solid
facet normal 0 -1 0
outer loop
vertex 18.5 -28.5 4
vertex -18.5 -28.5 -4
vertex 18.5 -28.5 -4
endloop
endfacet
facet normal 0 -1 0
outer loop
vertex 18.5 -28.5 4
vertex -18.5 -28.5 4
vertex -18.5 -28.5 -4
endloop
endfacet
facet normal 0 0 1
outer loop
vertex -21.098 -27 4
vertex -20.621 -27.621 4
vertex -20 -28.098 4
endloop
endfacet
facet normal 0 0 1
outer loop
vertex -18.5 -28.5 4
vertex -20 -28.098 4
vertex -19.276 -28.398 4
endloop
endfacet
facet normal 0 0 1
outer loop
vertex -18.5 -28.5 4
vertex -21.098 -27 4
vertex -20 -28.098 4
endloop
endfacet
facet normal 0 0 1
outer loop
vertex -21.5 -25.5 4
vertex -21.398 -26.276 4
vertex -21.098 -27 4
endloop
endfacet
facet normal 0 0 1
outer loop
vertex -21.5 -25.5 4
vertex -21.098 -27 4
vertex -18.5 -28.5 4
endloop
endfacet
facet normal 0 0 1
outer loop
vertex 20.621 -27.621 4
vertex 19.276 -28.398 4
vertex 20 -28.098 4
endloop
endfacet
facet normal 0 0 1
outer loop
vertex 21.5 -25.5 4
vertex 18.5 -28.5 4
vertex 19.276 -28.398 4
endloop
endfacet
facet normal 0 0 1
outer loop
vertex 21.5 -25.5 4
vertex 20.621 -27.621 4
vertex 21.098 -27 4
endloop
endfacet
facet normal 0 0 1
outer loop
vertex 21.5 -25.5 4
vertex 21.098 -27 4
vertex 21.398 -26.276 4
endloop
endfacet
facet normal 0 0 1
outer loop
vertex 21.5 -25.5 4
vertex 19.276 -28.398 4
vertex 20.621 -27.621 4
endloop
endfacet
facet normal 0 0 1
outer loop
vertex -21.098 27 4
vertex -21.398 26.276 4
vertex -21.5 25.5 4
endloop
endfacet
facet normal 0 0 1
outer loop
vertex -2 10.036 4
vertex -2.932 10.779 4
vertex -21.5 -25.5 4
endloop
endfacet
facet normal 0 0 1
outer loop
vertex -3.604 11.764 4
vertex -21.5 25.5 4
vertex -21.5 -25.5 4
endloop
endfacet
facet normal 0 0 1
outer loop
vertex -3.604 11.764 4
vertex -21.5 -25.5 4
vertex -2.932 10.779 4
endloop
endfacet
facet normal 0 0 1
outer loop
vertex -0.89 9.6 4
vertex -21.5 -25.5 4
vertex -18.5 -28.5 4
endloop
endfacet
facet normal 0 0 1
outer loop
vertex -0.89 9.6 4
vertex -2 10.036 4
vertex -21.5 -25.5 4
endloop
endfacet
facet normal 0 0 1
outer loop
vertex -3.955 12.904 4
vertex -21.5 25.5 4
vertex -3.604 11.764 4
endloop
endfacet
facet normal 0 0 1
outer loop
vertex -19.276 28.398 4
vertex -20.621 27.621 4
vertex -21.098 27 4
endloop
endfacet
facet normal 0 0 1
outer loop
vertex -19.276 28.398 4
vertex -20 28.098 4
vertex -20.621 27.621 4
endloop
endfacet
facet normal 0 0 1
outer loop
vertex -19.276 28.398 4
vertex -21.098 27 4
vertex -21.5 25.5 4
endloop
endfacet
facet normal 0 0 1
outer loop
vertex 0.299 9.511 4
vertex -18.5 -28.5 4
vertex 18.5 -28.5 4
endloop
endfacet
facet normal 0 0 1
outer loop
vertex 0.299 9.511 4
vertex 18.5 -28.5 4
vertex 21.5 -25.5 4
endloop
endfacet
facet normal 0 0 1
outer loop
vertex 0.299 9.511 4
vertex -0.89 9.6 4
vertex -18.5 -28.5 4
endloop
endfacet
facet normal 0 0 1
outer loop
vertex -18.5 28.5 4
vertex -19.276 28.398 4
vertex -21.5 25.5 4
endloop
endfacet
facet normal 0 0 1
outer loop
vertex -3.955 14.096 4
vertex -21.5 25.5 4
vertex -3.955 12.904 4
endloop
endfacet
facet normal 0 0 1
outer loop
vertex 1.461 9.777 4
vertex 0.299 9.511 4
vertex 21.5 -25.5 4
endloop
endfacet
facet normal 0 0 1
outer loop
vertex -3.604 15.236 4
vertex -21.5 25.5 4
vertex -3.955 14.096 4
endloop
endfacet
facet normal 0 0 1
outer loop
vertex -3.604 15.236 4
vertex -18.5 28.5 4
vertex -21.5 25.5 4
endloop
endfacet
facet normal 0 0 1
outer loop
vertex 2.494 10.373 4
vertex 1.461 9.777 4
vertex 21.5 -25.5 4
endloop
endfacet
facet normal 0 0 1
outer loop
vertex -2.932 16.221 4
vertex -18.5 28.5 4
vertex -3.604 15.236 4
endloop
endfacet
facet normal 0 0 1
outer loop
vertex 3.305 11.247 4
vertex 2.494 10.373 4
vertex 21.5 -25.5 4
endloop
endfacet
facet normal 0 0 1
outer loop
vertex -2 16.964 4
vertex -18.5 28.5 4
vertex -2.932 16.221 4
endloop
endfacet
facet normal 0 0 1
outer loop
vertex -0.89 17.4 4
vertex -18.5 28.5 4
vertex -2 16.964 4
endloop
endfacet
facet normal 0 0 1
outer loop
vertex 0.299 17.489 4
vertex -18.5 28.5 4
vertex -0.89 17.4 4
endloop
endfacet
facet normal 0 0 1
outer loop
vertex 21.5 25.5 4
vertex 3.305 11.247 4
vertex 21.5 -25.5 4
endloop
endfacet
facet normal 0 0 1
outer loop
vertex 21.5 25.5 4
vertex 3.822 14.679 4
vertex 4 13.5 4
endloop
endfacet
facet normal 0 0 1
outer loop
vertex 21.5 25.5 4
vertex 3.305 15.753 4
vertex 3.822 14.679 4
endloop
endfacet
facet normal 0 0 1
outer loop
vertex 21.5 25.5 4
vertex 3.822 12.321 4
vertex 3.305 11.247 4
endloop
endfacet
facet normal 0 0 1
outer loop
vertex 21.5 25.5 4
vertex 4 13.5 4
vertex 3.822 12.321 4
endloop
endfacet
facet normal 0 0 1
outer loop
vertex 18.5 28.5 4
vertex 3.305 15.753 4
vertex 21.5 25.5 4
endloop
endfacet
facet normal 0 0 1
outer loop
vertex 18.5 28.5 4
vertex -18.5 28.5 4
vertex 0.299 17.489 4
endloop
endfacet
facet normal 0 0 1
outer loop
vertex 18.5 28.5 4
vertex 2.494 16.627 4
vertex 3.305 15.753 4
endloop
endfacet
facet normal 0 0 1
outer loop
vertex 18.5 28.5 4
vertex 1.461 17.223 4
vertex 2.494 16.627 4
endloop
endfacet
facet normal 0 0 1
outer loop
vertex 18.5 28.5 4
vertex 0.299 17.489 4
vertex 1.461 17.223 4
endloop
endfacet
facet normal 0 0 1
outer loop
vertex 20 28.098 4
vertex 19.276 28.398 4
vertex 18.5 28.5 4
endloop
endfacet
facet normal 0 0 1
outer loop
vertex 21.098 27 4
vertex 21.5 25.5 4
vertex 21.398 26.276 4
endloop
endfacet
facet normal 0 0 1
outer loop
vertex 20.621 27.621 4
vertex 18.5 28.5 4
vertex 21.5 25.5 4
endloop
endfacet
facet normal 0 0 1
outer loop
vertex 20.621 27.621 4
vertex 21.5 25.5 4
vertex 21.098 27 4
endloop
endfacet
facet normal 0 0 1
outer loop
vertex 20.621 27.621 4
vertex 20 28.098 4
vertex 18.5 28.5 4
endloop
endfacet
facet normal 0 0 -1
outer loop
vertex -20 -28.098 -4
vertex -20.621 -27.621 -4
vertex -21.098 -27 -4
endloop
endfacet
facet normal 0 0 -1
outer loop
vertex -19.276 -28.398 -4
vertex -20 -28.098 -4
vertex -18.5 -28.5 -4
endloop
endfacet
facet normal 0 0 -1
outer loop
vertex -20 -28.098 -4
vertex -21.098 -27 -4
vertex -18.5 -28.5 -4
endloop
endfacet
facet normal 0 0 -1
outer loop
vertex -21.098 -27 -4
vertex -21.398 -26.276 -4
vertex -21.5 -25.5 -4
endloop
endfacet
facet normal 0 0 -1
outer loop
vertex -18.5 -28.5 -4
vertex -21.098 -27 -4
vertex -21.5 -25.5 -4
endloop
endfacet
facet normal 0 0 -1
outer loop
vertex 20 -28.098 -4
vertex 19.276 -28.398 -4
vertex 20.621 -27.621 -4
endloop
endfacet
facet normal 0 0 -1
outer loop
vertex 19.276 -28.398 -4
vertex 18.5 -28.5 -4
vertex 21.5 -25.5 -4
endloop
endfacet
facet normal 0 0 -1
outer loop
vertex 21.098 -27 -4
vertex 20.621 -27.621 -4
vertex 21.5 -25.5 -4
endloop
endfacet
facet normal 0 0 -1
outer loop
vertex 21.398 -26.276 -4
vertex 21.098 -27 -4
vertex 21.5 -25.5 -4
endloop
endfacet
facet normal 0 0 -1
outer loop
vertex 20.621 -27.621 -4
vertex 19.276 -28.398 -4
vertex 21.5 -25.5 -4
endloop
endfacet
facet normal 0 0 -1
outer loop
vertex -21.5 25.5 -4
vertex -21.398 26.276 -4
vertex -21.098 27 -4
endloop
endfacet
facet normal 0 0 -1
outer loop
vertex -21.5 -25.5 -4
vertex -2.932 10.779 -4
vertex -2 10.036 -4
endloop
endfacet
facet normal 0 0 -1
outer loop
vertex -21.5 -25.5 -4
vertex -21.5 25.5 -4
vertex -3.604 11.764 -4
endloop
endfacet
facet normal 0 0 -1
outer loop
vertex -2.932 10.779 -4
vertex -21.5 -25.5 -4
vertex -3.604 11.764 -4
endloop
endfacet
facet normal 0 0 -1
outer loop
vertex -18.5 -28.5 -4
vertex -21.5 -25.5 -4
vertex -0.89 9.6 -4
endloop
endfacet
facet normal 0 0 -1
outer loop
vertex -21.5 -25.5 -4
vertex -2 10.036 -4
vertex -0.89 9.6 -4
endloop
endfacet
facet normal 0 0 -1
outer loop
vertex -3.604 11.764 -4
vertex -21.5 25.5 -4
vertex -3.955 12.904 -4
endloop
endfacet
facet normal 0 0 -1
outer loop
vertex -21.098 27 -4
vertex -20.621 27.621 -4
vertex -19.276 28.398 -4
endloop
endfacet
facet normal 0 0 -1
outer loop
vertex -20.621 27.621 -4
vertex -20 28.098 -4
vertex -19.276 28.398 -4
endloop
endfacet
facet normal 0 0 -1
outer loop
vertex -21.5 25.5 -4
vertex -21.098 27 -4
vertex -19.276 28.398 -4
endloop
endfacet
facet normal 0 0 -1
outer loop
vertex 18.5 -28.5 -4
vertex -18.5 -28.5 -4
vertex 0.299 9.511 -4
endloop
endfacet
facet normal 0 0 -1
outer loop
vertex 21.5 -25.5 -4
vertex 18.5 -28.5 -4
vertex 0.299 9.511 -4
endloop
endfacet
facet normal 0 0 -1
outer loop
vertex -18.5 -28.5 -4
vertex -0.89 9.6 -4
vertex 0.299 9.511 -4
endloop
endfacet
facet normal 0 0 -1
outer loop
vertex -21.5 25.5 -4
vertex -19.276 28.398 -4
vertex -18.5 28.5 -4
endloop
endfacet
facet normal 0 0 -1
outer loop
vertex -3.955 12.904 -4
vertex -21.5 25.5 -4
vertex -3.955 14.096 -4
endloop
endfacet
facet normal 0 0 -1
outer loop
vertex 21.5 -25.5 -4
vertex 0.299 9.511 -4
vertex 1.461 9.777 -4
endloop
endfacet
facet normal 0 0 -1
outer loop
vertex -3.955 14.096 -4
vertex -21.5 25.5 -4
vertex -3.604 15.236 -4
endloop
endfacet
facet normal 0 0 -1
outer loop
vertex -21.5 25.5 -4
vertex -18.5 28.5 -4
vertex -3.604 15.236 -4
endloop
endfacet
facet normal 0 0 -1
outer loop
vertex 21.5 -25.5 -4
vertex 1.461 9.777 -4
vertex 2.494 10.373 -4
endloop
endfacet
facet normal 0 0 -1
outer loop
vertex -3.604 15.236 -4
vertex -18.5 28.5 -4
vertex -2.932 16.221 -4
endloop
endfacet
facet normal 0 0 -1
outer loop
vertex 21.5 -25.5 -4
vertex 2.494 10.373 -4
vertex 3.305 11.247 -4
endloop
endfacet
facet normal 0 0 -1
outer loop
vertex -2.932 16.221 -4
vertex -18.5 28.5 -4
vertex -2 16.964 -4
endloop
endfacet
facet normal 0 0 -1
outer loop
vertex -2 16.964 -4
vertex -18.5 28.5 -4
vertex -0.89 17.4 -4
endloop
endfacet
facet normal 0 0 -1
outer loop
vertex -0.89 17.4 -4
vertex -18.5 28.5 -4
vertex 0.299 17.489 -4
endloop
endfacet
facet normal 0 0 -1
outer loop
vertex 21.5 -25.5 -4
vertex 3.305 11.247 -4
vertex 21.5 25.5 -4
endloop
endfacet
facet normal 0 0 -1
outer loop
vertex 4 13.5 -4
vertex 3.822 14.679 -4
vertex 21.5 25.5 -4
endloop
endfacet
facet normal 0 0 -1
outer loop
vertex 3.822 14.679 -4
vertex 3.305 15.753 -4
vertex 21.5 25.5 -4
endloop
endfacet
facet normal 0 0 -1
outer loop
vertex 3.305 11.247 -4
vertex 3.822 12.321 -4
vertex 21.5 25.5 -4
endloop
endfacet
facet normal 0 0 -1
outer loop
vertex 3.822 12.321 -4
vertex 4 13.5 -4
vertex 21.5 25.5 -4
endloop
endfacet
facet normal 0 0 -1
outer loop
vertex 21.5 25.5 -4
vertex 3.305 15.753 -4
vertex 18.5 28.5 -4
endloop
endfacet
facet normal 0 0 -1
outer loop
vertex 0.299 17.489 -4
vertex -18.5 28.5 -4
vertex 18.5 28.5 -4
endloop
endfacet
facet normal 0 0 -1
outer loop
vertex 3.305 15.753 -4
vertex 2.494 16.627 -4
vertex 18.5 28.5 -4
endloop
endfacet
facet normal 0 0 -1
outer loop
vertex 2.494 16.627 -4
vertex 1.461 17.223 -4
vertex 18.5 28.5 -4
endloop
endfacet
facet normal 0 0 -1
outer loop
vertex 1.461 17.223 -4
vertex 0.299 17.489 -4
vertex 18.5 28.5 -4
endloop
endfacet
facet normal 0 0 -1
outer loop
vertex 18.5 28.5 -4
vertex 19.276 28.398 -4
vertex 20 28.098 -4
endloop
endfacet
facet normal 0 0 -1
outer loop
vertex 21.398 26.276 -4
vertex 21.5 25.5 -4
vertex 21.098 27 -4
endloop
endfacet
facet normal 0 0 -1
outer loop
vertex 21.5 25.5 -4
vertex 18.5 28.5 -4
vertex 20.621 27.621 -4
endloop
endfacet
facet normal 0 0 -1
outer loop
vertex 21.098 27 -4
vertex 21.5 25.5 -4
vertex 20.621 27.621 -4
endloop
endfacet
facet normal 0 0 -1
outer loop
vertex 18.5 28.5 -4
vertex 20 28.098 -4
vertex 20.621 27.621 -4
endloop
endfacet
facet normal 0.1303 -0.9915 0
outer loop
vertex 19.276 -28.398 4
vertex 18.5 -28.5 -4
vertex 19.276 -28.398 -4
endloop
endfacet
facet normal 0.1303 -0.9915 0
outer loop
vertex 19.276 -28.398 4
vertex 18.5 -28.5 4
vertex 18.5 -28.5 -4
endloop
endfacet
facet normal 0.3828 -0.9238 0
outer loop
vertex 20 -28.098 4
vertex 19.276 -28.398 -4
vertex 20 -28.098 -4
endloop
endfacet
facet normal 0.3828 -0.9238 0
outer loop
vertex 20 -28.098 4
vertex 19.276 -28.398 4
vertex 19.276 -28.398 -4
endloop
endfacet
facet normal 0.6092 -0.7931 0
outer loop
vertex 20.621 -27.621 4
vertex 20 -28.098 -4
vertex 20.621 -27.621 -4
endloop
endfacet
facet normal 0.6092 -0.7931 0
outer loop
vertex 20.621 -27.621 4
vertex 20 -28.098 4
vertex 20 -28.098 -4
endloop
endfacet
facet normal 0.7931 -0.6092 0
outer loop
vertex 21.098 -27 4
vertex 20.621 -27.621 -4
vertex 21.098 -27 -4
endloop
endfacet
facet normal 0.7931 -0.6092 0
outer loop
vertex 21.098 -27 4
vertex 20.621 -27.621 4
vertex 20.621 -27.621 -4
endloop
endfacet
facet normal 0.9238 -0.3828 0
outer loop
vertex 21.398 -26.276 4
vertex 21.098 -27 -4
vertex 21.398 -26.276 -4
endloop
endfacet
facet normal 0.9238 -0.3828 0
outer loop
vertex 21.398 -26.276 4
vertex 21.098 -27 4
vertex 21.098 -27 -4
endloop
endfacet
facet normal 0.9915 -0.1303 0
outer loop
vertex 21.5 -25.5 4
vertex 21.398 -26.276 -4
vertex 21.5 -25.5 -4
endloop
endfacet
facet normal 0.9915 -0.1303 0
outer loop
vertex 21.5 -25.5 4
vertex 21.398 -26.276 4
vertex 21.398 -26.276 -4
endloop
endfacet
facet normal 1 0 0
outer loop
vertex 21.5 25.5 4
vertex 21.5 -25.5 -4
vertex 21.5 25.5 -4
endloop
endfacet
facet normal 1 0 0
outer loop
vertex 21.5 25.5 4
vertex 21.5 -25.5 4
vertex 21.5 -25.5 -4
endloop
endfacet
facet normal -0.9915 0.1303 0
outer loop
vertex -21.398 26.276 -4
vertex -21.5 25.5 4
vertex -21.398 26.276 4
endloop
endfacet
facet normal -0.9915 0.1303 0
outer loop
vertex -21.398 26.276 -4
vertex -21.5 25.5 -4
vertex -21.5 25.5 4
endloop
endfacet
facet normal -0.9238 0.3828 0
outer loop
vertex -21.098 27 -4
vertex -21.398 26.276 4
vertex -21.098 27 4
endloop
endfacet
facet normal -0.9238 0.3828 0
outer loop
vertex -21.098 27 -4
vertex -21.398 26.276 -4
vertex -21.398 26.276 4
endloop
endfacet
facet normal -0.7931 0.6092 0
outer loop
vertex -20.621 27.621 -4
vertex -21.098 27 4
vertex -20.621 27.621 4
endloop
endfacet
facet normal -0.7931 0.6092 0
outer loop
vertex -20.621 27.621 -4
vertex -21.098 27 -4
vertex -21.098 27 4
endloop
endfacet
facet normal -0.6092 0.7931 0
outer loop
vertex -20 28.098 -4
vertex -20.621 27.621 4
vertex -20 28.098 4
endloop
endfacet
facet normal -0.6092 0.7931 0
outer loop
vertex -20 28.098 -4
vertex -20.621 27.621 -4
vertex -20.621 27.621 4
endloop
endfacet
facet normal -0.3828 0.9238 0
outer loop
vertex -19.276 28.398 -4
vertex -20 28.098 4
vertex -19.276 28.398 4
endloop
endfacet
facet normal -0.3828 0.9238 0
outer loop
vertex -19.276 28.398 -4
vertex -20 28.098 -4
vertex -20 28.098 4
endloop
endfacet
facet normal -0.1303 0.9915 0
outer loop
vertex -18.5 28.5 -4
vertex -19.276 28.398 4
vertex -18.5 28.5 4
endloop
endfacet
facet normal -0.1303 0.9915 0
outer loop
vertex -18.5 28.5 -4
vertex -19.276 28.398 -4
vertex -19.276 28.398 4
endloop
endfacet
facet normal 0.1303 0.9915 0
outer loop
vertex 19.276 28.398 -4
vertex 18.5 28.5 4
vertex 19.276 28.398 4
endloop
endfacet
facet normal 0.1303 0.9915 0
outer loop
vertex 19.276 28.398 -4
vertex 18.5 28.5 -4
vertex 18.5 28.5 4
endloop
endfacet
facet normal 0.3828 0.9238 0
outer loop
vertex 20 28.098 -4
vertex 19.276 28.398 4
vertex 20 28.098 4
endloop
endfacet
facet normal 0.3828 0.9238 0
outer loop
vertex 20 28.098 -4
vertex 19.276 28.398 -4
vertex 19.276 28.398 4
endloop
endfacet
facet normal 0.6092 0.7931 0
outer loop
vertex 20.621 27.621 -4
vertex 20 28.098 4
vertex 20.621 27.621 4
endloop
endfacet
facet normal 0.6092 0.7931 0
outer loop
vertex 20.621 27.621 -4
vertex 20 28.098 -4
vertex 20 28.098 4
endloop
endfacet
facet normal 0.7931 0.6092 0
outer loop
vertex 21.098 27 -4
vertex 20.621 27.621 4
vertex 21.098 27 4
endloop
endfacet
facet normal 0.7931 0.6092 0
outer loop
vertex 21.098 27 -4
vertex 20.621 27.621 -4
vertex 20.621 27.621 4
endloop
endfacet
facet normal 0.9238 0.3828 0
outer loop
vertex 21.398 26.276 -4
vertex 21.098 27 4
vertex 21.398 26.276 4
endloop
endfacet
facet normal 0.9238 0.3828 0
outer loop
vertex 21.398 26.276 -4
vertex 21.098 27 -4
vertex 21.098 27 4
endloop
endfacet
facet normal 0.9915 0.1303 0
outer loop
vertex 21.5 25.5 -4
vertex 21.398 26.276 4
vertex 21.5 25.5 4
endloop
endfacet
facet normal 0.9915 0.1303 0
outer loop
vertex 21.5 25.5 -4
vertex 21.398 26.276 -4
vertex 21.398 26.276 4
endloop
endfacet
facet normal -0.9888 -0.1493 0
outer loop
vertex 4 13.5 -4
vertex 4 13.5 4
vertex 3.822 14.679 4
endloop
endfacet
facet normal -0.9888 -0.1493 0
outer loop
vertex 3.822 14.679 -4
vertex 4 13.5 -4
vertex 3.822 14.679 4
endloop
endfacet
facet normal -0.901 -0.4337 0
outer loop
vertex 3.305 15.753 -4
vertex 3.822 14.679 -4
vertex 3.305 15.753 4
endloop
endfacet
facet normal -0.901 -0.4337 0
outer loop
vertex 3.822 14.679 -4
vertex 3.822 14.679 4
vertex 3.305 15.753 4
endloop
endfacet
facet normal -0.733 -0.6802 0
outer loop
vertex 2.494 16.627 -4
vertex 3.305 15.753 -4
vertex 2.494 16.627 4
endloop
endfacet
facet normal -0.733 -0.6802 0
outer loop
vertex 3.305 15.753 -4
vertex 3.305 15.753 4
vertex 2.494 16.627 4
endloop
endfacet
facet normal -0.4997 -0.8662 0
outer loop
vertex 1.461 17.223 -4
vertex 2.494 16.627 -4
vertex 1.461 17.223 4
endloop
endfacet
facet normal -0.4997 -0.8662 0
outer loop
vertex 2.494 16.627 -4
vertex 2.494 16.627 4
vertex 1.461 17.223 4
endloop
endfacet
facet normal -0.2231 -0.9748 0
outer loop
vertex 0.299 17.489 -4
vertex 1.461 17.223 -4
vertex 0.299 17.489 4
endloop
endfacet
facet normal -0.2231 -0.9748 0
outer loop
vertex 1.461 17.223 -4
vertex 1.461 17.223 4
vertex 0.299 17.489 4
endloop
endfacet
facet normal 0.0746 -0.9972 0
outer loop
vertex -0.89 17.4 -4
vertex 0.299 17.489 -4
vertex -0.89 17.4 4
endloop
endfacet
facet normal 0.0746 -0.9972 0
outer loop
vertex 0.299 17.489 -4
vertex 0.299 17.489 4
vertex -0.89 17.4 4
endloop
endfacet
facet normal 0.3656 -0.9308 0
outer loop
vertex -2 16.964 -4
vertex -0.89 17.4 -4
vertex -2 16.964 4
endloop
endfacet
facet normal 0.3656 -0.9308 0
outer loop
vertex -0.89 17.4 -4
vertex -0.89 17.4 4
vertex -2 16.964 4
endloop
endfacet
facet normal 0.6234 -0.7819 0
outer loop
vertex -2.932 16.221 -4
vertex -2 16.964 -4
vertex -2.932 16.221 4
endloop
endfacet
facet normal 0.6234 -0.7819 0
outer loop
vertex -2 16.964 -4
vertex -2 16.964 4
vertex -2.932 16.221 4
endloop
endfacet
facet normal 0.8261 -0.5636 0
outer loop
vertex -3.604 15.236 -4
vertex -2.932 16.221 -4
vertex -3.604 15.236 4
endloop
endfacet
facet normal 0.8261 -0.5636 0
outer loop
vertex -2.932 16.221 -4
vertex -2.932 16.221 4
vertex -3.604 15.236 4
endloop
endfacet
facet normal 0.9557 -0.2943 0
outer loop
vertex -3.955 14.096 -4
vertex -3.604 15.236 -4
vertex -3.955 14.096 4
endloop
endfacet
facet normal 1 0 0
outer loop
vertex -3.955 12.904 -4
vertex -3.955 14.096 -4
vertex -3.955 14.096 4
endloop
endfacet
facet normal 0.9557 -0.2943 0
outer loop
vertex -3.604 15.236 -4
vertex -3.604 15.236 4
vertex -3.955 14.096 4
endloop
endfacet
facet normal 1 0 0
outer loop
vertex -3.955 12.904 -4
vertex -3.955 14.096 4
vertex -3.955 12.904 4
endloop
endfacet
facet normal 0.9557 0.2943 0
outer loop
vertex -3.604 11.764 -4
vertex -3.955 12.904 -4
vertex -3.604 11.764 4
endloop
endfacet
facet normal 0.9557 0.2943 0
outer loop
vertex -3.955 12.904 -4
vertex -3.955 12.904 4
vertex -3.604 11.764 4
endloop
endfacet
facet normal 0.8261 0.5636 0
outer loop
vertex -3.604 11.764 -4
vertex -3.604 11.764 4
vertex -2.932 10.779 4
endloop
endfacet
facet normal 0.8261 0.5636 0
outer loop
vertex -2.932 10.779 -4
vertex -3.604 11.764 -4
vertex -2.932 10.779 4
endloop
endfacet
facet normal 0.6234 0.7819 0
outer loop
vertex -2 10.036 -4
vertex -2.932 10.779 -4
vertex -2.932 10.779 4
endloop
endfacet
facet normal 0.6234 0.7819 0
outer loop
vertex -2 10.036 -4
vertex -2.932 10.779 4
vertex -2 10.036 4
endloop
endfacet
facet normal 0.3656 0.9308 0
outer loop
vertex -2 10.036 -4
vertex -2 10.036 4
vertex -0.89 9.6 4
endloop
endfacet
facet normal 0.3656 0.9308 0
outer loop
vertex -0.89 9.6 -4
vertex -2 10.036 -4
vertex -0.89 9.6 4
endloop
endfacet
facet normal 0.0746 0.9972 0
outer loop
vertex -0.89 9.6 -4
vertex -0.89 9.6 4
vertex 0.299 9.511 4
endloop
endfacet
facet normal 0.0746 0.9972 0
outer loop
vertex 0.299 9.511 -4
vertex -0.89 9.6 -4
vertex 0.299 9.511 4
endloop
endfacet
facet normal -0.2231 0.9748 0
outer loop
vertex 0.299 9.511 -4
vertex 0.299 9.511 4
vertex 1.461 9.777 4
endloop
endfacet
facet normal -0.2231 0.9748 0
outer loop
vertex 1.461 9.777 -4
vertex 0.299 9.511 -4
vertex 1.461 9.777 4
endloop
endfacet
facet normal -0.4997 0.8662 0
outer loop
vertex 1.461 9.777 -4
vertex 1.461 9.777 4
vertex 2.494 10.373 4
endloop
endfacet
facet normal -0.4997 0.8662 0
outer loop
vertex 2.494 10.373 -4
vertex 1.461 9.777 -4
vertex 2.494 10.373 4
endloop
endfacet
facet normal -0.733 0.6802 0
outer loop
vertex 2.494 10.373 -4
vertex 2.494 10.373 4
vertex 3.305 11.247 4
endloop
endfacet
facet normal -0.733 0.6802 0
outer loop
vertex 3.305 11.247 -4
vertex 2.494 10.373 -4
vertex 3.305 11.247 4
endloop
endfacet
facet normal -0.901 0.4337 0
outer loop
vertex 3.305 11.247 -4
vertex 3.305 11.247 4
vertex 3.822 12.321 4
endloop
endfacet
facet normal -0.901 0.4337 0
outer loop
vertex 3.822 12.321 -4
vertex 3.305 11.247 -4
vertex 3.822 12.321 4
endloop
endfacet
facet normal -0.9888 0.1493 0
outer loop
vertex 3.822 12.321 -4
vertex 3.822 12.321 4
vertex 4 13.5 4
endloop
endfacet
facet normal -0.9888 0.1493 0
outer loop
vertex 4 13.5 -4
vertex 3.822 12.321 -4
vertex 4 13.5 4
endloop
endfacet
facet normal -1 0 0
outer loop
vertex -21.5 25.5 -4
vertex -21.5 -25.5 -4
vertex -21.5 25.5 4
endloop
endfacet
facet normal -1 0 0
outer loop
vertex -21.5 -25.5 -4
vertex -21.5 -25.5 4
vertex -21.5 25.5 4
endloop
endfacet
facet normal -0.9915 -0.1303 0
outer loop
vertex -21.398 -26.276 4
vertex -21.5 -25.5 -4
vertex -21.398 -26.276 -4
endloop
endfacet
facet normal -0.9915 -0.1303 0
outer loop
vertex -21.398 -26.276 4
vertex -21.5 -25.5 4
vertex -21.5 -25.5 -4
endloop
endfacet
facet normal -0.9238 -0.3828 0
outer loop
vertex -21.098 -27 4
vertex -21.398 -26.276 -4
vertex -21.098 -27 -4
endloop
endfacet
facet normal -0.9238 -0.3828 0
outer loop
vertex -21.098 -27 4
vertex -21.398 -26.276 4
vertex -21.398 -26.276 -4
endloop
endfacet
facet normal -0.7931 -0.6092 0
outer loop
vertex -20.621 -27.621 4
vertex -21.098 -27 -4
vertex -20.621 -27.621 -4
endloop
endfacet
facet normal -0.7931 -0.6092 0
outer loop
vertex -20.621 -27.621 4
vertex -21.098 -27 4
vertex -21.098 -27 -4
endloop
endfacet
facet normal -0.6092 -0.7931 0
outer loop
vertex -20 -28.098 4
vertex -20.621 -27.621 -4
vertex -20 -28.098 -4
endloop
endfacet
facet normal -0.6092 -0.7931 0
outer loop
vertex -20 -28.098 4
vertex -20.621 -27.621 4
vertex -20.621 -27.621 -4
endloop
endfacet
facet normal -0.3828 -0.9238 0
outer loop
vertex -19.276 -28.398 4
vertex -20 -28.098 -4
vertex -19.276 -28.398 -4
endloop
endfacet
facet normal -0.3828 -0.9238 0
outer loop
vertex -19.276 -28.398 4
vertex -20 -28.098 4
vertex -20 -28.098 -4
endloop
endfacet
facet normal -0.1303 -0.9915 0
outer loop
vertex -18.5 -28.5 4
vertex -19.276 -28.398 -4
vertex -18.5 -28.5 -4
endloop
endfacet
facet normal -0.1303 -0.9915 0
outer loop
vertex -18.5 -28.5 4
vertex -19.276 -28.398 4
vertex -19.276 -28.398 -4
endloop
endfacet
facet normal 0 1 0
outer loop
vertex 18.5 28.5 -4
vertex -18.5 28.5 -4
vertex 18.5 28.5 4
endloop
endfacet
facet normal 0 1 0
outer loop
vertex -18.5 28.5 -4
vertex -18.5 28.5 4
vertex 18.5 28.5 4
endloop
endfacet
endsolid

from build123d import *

# Parameters (mm, degrees)
SKETCH1_W           = 43
SKETCH1_H           = 57
BOSS_EXTRUDE1_DEPTH = 4
SKETCH2_R           = 4
CUT_EXTRUDE1_DEPTH  = 37.58551626
FILLET1_R           = 3


with BuildPart() as part:
    # Sketch1 → Boss-Extrude1 (new, symmetric)
    with BuildSketch(Plane.XY):
        Rectangle(SKETCH1_W, SKETCH1_H)
    extrude(amount=BOSS_EXTRUDE1_DEPTH, both=True)

    # Sketch2 → Cut-Extrude1 (cut, through all)
    with BuildSketch(Plane.XY.offset(4)):
        with Locations((0, 13.5)):
            Circle(SKETCH2_R)
    extrude(amount=-CUT_EXTRUDE1_DEPTH, mode=Mode.SUBTRACT)

    # Fillet1
    fillet1_edges = [part.edges().sort_by_distance(p)[0] for p in [
        (21.5, -28.5, 0),
        (-21.5, -28.5, 0),
        (-21.5, 28.5, 0),
        (21.5, 28.5, 0),
    ]]
    fillet(fillet1_edges, radius=FILLET1_R)


solid = part.part
